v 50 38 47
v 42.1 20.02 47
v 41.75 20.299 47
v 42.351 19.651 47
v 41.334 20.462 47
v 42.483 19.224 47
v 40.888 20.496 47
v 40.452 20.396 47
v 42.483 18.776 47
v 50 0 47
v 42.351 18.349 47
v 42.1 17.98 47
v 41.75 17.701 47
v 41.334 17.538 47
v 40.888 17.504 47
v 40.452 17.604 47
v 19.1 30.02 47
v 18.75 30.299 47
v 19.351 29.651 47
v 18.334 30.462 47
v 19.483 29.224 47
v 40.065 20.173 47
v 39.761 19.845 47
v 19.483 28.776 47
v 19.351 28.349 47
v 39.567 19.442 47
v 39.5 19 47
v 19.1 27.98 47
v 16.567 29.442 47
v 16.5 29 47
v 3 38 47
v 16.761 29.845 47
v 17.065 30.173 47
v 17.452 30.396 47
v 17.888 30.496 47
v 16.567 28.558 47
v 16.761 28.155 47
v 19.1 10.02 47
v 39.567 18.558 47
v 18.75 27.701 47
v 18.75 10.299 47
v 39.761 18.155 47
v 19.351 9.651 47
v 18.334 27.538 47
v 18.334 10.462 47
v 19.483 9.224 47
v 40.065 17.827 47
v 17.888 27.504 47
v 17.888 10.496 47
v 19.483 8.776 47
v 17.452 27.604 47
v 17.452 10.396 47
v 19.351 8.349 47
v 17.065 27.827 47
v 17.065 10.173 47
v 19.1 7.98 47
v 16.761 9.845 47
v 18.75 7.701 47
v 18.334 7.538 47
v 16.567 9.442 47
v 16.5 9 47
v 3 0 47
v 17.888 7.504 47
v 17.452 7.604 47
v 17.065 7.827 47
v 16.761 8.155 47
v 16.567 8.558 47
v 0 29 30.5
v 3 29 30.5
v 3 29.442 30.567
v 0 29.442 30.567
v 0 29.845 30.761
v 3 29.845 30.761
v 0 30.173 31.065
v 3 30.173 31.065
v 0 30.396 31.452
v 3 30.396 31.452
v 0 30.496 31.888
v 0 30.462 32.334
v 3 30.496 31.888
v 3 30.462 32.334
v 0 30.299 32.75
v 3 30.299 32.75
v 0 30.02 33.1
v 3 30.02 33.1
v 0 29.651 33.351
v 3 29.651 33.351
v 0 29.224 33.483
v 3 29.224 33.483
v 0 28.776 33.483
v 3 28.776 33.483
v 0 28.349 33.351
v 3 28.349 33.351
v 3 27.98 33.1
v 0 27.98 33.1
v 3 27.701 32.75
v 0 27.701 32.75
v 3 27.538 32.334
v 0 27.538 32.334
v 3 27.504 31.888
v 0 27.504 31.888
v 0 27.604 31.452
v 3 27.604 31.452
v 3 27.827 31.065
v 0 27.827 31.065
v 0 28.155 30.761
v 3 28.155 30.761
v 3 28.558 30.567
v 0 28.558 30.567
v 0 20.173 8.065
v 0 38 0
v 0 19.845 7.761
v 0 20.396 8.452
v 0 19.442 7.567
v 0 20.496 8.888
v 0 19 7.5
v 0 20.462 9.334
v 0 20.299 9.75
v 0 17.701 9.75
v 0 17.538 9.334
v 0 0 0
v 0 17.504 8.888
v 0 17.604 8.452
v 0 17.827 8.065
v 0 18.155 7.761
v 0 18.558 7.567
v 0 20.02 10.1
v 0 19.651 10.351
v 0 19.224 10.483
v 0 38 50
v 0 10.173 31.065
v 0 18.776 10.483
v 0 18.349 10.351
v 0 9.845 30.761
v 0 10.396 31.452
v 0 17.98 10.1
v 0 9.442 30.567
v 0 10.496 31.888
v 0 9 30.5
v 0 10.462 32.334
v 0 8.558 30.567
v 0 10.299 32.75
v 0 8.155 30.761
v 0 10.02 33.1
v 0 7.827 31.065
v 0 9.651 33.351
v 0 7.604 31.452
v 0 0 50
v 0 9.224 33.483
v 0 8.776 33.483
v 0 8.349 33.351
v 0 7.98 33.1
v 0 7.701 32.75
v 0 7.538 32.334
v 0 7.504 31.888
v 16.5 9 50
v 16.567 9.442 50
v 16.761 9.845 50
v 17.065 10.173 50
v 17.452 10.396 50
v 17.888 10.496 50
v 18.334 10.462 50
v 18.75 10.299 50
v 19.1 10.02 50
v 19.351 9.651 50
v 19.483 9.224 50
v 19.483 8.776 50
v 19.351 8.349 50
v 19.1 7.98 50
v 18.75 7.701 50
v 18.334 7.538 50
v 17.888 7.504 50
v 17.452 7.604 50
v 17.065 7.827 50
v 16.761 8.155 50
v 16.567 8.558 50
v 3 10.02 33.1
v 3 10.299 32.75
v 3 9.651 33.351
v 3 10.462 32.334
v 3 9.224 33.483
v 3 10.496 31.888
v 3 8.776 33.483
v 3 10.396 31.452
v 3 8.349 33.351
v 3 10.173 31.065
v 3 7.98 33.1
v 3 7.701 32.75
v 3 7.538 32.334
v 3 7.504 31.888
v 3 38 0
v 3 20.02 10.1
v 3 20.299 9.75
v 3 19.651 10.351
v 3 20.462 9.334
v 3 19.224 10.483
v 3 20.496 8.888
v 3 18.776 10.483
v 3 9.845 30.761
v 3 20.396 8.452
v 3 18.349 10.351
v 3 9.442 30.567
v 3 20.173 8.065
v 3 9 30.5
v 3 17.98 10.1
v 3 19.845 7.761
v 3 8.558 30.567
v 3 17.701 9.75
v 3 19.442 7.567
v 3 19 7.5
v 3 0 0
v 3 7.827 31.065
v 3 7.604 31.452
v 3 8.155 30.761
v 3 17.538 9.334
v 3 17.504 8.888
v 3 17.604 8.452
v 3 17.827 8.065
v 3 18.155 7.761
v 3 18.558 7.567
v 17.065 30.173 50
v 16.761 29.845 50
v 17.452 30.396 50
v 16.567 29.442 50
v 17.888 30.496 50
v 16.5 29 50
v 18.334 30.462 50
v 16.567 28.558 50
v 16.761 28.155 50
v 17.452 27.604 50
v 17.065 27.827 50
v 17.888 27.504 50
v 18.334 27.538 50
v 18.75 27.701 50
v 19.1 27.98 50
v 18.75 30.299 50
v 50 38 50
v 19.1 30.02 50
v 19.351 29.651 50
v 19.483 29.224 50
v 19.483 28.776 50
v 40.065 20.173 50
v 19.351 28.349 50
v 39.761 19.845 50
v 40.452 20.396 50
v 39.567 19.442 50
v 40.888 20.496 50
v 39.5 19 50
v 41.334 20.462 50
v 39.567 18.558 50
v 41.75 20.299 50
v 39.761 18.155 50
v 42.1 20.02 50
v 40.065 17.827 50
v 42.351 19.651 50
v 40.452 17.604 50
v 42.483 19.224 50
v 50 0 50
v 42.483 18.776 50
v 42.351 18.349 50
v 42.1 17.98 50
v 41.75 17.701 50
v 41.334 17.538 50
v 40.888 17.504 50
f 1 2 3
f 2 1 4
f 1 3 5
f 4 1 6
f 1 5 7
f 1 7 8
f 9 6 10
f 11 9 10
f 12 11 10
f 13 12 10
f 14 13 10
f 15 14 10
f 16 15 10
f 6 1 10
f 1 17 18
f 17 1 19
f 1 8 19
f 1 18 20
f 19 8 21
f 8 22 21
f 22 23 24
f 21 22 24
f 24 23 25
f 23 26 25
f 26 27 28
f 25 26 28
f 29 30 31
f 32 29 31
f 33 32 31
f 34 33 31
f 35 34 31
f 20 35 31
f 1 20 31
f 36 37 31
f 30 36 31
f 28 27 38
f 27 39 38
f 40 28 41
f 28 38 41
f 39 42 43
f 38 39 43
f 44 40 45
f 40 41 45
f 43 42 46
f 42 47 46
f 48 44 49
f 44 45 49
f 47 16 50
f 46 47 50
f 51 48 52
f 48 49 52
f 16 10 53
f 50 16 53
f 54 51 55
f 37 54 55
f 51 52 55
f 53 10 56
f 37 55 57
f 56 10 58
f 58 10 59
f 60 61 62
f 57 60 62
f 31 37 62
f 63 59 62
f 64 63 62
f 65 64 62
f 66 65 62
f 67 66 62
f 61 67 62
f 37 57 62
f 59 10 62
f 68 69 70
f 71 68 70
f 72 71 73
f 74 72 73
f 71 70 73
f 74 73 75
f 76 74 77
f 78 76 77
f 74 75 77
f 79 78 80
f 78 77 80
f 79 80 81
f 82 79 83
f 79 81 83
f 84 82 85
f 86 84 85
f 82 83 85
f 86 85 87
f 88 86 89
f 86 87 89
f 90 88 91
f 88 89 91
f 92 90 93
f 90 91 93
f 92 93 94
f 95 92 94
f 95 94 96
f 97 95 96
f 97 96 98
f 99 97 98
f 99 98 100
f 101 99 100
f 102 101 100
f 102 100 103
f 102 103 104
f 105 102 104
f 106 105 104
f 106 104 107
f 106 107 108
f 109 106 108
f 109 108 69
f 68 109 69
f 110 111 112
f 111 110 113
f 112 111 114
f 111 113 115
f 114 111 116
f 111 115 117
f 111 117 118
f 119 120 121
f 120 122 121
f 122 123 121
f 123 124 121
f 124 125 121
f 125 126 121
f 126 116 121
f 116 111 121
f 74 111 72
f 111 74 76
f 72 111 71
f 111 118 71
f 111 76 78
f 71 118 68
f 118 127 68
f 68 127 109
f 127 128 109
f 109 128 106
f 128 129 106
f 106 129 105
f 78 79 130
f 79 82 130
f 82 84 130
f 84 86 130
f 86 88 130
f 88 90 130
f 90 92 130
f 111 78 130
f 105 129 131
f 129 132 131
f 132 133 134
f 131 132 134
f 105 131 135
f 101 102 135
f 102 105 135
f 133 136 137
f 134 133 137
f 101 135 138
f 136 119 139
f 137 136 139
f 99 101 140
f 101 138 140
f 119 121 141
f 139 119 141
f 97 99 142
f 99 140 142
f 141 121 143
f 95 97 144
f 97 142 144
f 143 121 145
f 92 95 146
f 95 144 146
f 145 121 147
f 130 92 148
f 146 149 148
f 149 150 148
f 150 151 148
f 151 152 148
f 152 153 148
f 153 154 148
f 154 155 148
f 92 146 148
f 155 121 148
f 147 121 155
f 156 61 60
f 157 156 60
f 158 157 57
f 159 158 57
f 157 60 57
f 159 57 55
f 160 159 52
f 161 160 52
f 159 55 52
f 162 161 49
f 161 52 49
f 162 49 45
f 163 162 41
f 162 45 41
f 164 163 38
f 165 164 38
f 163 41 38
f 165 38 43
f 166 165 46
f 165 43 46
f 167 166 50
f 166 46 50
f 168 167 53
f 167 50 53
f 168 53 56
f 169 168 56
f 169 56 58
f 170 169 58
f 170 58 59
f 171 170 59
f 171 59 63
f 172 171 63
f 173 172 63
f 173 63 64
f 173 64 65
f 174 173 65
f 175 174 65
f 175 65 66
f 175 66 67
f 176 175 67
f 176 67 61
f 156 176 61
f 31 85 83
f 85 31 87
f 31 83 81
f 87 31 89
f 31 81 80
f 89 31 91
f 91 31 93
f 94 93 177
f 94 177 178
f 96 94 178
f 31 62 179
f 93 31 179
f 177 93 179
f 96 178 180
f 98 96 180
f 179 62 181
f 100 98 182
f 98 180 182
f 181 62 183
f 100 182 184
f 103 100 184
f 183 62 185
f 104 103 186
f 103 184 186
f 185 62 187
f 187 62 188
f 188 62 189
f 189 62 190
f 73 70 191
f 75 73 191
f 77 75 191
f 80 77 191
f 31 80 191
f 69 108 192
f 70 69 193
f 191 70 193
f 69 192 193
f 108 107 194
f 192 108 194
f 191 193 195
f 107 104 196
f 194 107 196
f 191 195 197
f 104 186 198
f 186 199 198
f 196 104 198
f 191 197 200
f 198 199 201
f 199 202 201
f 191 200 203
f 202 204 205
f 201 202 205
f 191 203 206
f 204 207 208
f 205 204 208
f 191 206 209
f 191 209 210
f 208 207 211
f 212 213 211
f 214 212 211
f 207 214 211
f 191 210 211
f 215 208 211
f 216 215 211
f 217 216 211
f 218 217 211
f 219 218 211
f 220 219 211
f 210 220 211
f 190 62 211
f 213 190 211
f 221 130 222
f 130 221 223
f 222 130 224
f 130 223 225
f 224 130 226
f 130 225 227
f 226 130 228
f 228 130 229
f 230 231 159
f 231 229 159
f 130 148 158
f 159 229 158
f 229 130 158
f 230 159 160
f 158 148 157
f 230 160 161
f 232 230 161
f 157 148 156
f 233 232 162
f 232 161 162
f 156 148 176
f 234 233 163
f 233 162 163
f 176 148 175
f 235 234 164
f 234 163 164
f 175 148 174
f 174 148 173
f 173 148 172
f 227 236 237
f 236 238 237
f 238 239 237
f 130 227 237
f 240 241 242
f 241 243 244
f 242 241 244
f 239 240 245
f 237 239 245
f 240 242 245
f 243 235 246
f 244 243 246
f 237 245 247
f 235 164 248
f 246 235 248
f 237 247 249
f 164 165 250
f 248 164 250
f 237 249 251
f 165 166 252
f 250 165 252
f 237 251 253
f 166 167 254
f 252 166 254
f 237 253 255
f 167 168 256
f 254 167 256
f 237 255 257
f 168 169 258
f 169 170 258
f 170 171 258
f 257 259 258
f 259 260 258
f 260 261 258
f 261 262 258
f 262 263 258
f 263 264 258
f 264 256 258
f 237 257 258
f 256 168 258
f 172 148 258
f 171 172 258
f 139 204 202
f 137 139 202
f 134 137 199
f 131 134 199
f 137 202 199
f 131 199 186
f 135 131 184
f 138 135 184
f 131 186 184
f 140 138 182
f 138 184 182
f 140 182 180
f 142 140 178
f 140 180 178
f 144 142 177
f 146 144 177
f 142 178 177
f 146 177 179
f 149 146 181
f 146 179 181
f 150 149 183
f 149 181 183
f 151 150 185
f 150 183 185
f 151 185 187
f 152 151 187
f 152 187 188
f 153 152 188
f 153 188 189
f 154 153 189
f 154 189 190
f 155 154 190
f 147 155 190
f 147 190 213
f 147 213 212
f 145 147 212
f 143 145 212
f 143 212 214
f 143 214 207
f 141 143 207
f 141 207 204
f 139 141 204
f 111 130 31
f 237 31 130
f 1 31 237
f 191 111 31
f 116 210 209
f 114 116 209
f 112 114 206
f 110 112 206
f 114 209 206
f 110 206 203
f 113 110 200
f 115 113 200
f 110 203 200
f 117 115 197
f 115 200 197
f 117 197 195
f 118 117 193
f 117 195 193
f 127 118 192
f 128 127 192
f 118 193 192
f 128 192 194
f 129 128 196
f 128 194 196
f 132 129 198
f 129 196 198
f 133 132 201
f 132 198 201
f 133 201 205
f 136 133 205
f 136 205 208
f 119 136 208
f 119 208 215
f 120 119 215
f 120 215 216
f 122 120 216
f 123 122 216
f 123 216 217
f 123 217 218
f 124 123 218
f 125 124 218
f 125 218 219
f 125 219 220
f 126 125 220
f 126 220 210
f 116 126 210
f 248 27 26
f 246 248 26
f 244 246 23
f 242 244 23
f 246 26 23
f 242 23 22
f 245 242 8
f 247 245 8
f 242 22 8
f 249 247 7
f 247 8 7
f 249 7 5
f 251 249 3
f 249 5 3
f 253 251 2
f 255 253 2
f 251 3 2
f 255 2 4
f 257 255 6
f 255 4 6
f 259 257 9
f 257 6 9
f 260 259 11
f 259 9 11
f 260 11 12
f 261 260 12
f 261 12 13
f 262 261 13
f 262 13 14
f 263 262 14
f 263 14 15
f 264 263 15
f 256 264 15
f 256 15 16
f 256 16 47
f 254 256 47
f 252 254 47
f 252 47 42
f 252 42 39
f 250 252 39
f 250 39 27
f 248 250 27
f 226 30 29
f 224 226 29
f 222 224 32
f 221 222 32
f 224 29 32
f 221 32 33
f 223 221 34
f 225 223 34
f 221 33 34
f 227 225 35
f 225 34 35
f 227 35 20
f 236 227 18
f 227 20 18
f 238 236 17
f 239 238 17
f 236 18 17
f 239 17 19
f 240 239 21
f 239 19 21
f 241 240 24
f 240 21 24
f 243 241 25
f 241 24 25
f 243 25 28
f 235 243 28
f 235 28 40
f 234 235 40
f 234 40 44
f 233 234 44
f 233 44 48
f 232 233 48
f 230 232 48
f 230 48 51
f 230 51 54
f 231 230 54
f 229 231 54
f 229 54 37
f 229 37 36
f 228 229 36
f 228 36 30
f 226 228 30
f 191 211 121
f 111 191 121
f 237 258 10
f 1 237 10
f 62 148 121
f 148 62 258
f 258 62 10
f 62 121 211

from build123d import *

# Parameters (mm, degrees)
EXTRUDE_2_DEPTH     = 38
SKETCH_4_R          = 1.5
CUT_EXTRUDE_1_DEPTH = 50
SKETCH_5_R          = 1.5
CUT_EXTRUDE_2_DEPTH = 50


with BuildPart() as part:
    # 草图3 → 凸台-拉伸2 (new body)
    with BuildSketch(Plane(origin=(0, 0, 0), x_dir=(1, 0, 0), z_dir=(0, 1, 0))):
        Polygon((0, 0), (0, -50), (50, -50), (50, -47), (3, -47), (3, 0), align=None)
    extrude(amount=EXTRUDE_2_DEPTH)

    # 草图4 → 切除-拉伸1 (cut)
    with BuildSketch(Plane(origin=(3, 0, 0), x_dir=(0, 0, -1), z_dir=(1, 0, 0))):
        with Locations((-32, 29)):
            Circle(SKETCH_4_R)
        with Locations((-32, 9)):
            Circle(SKETCH_4_R)
        with Locations((-9, 19)):
            Circle(SKETCH_4_R)
    extrude(amount=-CUT_EXTRUDE_1_DEPTH, mode=Mode.SUBTRACT)

    # 草图5 → 切除-拉伸2 (cut)
    with BuildSketch(Plane(origin=(0, 0, 47), x_dir=(-1, 0, 0), z_dir=(0, 0, -1))):
        with Locations((-18, 29)):
            Circle(SKETCH_5_R)
        with Locations((-18, 9)):
            Circle(SKETCH_5_R)
        with Locations((-41, 19)):
            Circle(SKETCH_5_R)
    extrude(amount=-CUT_EXTRUDE_2_DEPTH, mode=Mode.SUBTRACT)


solid = part.part
